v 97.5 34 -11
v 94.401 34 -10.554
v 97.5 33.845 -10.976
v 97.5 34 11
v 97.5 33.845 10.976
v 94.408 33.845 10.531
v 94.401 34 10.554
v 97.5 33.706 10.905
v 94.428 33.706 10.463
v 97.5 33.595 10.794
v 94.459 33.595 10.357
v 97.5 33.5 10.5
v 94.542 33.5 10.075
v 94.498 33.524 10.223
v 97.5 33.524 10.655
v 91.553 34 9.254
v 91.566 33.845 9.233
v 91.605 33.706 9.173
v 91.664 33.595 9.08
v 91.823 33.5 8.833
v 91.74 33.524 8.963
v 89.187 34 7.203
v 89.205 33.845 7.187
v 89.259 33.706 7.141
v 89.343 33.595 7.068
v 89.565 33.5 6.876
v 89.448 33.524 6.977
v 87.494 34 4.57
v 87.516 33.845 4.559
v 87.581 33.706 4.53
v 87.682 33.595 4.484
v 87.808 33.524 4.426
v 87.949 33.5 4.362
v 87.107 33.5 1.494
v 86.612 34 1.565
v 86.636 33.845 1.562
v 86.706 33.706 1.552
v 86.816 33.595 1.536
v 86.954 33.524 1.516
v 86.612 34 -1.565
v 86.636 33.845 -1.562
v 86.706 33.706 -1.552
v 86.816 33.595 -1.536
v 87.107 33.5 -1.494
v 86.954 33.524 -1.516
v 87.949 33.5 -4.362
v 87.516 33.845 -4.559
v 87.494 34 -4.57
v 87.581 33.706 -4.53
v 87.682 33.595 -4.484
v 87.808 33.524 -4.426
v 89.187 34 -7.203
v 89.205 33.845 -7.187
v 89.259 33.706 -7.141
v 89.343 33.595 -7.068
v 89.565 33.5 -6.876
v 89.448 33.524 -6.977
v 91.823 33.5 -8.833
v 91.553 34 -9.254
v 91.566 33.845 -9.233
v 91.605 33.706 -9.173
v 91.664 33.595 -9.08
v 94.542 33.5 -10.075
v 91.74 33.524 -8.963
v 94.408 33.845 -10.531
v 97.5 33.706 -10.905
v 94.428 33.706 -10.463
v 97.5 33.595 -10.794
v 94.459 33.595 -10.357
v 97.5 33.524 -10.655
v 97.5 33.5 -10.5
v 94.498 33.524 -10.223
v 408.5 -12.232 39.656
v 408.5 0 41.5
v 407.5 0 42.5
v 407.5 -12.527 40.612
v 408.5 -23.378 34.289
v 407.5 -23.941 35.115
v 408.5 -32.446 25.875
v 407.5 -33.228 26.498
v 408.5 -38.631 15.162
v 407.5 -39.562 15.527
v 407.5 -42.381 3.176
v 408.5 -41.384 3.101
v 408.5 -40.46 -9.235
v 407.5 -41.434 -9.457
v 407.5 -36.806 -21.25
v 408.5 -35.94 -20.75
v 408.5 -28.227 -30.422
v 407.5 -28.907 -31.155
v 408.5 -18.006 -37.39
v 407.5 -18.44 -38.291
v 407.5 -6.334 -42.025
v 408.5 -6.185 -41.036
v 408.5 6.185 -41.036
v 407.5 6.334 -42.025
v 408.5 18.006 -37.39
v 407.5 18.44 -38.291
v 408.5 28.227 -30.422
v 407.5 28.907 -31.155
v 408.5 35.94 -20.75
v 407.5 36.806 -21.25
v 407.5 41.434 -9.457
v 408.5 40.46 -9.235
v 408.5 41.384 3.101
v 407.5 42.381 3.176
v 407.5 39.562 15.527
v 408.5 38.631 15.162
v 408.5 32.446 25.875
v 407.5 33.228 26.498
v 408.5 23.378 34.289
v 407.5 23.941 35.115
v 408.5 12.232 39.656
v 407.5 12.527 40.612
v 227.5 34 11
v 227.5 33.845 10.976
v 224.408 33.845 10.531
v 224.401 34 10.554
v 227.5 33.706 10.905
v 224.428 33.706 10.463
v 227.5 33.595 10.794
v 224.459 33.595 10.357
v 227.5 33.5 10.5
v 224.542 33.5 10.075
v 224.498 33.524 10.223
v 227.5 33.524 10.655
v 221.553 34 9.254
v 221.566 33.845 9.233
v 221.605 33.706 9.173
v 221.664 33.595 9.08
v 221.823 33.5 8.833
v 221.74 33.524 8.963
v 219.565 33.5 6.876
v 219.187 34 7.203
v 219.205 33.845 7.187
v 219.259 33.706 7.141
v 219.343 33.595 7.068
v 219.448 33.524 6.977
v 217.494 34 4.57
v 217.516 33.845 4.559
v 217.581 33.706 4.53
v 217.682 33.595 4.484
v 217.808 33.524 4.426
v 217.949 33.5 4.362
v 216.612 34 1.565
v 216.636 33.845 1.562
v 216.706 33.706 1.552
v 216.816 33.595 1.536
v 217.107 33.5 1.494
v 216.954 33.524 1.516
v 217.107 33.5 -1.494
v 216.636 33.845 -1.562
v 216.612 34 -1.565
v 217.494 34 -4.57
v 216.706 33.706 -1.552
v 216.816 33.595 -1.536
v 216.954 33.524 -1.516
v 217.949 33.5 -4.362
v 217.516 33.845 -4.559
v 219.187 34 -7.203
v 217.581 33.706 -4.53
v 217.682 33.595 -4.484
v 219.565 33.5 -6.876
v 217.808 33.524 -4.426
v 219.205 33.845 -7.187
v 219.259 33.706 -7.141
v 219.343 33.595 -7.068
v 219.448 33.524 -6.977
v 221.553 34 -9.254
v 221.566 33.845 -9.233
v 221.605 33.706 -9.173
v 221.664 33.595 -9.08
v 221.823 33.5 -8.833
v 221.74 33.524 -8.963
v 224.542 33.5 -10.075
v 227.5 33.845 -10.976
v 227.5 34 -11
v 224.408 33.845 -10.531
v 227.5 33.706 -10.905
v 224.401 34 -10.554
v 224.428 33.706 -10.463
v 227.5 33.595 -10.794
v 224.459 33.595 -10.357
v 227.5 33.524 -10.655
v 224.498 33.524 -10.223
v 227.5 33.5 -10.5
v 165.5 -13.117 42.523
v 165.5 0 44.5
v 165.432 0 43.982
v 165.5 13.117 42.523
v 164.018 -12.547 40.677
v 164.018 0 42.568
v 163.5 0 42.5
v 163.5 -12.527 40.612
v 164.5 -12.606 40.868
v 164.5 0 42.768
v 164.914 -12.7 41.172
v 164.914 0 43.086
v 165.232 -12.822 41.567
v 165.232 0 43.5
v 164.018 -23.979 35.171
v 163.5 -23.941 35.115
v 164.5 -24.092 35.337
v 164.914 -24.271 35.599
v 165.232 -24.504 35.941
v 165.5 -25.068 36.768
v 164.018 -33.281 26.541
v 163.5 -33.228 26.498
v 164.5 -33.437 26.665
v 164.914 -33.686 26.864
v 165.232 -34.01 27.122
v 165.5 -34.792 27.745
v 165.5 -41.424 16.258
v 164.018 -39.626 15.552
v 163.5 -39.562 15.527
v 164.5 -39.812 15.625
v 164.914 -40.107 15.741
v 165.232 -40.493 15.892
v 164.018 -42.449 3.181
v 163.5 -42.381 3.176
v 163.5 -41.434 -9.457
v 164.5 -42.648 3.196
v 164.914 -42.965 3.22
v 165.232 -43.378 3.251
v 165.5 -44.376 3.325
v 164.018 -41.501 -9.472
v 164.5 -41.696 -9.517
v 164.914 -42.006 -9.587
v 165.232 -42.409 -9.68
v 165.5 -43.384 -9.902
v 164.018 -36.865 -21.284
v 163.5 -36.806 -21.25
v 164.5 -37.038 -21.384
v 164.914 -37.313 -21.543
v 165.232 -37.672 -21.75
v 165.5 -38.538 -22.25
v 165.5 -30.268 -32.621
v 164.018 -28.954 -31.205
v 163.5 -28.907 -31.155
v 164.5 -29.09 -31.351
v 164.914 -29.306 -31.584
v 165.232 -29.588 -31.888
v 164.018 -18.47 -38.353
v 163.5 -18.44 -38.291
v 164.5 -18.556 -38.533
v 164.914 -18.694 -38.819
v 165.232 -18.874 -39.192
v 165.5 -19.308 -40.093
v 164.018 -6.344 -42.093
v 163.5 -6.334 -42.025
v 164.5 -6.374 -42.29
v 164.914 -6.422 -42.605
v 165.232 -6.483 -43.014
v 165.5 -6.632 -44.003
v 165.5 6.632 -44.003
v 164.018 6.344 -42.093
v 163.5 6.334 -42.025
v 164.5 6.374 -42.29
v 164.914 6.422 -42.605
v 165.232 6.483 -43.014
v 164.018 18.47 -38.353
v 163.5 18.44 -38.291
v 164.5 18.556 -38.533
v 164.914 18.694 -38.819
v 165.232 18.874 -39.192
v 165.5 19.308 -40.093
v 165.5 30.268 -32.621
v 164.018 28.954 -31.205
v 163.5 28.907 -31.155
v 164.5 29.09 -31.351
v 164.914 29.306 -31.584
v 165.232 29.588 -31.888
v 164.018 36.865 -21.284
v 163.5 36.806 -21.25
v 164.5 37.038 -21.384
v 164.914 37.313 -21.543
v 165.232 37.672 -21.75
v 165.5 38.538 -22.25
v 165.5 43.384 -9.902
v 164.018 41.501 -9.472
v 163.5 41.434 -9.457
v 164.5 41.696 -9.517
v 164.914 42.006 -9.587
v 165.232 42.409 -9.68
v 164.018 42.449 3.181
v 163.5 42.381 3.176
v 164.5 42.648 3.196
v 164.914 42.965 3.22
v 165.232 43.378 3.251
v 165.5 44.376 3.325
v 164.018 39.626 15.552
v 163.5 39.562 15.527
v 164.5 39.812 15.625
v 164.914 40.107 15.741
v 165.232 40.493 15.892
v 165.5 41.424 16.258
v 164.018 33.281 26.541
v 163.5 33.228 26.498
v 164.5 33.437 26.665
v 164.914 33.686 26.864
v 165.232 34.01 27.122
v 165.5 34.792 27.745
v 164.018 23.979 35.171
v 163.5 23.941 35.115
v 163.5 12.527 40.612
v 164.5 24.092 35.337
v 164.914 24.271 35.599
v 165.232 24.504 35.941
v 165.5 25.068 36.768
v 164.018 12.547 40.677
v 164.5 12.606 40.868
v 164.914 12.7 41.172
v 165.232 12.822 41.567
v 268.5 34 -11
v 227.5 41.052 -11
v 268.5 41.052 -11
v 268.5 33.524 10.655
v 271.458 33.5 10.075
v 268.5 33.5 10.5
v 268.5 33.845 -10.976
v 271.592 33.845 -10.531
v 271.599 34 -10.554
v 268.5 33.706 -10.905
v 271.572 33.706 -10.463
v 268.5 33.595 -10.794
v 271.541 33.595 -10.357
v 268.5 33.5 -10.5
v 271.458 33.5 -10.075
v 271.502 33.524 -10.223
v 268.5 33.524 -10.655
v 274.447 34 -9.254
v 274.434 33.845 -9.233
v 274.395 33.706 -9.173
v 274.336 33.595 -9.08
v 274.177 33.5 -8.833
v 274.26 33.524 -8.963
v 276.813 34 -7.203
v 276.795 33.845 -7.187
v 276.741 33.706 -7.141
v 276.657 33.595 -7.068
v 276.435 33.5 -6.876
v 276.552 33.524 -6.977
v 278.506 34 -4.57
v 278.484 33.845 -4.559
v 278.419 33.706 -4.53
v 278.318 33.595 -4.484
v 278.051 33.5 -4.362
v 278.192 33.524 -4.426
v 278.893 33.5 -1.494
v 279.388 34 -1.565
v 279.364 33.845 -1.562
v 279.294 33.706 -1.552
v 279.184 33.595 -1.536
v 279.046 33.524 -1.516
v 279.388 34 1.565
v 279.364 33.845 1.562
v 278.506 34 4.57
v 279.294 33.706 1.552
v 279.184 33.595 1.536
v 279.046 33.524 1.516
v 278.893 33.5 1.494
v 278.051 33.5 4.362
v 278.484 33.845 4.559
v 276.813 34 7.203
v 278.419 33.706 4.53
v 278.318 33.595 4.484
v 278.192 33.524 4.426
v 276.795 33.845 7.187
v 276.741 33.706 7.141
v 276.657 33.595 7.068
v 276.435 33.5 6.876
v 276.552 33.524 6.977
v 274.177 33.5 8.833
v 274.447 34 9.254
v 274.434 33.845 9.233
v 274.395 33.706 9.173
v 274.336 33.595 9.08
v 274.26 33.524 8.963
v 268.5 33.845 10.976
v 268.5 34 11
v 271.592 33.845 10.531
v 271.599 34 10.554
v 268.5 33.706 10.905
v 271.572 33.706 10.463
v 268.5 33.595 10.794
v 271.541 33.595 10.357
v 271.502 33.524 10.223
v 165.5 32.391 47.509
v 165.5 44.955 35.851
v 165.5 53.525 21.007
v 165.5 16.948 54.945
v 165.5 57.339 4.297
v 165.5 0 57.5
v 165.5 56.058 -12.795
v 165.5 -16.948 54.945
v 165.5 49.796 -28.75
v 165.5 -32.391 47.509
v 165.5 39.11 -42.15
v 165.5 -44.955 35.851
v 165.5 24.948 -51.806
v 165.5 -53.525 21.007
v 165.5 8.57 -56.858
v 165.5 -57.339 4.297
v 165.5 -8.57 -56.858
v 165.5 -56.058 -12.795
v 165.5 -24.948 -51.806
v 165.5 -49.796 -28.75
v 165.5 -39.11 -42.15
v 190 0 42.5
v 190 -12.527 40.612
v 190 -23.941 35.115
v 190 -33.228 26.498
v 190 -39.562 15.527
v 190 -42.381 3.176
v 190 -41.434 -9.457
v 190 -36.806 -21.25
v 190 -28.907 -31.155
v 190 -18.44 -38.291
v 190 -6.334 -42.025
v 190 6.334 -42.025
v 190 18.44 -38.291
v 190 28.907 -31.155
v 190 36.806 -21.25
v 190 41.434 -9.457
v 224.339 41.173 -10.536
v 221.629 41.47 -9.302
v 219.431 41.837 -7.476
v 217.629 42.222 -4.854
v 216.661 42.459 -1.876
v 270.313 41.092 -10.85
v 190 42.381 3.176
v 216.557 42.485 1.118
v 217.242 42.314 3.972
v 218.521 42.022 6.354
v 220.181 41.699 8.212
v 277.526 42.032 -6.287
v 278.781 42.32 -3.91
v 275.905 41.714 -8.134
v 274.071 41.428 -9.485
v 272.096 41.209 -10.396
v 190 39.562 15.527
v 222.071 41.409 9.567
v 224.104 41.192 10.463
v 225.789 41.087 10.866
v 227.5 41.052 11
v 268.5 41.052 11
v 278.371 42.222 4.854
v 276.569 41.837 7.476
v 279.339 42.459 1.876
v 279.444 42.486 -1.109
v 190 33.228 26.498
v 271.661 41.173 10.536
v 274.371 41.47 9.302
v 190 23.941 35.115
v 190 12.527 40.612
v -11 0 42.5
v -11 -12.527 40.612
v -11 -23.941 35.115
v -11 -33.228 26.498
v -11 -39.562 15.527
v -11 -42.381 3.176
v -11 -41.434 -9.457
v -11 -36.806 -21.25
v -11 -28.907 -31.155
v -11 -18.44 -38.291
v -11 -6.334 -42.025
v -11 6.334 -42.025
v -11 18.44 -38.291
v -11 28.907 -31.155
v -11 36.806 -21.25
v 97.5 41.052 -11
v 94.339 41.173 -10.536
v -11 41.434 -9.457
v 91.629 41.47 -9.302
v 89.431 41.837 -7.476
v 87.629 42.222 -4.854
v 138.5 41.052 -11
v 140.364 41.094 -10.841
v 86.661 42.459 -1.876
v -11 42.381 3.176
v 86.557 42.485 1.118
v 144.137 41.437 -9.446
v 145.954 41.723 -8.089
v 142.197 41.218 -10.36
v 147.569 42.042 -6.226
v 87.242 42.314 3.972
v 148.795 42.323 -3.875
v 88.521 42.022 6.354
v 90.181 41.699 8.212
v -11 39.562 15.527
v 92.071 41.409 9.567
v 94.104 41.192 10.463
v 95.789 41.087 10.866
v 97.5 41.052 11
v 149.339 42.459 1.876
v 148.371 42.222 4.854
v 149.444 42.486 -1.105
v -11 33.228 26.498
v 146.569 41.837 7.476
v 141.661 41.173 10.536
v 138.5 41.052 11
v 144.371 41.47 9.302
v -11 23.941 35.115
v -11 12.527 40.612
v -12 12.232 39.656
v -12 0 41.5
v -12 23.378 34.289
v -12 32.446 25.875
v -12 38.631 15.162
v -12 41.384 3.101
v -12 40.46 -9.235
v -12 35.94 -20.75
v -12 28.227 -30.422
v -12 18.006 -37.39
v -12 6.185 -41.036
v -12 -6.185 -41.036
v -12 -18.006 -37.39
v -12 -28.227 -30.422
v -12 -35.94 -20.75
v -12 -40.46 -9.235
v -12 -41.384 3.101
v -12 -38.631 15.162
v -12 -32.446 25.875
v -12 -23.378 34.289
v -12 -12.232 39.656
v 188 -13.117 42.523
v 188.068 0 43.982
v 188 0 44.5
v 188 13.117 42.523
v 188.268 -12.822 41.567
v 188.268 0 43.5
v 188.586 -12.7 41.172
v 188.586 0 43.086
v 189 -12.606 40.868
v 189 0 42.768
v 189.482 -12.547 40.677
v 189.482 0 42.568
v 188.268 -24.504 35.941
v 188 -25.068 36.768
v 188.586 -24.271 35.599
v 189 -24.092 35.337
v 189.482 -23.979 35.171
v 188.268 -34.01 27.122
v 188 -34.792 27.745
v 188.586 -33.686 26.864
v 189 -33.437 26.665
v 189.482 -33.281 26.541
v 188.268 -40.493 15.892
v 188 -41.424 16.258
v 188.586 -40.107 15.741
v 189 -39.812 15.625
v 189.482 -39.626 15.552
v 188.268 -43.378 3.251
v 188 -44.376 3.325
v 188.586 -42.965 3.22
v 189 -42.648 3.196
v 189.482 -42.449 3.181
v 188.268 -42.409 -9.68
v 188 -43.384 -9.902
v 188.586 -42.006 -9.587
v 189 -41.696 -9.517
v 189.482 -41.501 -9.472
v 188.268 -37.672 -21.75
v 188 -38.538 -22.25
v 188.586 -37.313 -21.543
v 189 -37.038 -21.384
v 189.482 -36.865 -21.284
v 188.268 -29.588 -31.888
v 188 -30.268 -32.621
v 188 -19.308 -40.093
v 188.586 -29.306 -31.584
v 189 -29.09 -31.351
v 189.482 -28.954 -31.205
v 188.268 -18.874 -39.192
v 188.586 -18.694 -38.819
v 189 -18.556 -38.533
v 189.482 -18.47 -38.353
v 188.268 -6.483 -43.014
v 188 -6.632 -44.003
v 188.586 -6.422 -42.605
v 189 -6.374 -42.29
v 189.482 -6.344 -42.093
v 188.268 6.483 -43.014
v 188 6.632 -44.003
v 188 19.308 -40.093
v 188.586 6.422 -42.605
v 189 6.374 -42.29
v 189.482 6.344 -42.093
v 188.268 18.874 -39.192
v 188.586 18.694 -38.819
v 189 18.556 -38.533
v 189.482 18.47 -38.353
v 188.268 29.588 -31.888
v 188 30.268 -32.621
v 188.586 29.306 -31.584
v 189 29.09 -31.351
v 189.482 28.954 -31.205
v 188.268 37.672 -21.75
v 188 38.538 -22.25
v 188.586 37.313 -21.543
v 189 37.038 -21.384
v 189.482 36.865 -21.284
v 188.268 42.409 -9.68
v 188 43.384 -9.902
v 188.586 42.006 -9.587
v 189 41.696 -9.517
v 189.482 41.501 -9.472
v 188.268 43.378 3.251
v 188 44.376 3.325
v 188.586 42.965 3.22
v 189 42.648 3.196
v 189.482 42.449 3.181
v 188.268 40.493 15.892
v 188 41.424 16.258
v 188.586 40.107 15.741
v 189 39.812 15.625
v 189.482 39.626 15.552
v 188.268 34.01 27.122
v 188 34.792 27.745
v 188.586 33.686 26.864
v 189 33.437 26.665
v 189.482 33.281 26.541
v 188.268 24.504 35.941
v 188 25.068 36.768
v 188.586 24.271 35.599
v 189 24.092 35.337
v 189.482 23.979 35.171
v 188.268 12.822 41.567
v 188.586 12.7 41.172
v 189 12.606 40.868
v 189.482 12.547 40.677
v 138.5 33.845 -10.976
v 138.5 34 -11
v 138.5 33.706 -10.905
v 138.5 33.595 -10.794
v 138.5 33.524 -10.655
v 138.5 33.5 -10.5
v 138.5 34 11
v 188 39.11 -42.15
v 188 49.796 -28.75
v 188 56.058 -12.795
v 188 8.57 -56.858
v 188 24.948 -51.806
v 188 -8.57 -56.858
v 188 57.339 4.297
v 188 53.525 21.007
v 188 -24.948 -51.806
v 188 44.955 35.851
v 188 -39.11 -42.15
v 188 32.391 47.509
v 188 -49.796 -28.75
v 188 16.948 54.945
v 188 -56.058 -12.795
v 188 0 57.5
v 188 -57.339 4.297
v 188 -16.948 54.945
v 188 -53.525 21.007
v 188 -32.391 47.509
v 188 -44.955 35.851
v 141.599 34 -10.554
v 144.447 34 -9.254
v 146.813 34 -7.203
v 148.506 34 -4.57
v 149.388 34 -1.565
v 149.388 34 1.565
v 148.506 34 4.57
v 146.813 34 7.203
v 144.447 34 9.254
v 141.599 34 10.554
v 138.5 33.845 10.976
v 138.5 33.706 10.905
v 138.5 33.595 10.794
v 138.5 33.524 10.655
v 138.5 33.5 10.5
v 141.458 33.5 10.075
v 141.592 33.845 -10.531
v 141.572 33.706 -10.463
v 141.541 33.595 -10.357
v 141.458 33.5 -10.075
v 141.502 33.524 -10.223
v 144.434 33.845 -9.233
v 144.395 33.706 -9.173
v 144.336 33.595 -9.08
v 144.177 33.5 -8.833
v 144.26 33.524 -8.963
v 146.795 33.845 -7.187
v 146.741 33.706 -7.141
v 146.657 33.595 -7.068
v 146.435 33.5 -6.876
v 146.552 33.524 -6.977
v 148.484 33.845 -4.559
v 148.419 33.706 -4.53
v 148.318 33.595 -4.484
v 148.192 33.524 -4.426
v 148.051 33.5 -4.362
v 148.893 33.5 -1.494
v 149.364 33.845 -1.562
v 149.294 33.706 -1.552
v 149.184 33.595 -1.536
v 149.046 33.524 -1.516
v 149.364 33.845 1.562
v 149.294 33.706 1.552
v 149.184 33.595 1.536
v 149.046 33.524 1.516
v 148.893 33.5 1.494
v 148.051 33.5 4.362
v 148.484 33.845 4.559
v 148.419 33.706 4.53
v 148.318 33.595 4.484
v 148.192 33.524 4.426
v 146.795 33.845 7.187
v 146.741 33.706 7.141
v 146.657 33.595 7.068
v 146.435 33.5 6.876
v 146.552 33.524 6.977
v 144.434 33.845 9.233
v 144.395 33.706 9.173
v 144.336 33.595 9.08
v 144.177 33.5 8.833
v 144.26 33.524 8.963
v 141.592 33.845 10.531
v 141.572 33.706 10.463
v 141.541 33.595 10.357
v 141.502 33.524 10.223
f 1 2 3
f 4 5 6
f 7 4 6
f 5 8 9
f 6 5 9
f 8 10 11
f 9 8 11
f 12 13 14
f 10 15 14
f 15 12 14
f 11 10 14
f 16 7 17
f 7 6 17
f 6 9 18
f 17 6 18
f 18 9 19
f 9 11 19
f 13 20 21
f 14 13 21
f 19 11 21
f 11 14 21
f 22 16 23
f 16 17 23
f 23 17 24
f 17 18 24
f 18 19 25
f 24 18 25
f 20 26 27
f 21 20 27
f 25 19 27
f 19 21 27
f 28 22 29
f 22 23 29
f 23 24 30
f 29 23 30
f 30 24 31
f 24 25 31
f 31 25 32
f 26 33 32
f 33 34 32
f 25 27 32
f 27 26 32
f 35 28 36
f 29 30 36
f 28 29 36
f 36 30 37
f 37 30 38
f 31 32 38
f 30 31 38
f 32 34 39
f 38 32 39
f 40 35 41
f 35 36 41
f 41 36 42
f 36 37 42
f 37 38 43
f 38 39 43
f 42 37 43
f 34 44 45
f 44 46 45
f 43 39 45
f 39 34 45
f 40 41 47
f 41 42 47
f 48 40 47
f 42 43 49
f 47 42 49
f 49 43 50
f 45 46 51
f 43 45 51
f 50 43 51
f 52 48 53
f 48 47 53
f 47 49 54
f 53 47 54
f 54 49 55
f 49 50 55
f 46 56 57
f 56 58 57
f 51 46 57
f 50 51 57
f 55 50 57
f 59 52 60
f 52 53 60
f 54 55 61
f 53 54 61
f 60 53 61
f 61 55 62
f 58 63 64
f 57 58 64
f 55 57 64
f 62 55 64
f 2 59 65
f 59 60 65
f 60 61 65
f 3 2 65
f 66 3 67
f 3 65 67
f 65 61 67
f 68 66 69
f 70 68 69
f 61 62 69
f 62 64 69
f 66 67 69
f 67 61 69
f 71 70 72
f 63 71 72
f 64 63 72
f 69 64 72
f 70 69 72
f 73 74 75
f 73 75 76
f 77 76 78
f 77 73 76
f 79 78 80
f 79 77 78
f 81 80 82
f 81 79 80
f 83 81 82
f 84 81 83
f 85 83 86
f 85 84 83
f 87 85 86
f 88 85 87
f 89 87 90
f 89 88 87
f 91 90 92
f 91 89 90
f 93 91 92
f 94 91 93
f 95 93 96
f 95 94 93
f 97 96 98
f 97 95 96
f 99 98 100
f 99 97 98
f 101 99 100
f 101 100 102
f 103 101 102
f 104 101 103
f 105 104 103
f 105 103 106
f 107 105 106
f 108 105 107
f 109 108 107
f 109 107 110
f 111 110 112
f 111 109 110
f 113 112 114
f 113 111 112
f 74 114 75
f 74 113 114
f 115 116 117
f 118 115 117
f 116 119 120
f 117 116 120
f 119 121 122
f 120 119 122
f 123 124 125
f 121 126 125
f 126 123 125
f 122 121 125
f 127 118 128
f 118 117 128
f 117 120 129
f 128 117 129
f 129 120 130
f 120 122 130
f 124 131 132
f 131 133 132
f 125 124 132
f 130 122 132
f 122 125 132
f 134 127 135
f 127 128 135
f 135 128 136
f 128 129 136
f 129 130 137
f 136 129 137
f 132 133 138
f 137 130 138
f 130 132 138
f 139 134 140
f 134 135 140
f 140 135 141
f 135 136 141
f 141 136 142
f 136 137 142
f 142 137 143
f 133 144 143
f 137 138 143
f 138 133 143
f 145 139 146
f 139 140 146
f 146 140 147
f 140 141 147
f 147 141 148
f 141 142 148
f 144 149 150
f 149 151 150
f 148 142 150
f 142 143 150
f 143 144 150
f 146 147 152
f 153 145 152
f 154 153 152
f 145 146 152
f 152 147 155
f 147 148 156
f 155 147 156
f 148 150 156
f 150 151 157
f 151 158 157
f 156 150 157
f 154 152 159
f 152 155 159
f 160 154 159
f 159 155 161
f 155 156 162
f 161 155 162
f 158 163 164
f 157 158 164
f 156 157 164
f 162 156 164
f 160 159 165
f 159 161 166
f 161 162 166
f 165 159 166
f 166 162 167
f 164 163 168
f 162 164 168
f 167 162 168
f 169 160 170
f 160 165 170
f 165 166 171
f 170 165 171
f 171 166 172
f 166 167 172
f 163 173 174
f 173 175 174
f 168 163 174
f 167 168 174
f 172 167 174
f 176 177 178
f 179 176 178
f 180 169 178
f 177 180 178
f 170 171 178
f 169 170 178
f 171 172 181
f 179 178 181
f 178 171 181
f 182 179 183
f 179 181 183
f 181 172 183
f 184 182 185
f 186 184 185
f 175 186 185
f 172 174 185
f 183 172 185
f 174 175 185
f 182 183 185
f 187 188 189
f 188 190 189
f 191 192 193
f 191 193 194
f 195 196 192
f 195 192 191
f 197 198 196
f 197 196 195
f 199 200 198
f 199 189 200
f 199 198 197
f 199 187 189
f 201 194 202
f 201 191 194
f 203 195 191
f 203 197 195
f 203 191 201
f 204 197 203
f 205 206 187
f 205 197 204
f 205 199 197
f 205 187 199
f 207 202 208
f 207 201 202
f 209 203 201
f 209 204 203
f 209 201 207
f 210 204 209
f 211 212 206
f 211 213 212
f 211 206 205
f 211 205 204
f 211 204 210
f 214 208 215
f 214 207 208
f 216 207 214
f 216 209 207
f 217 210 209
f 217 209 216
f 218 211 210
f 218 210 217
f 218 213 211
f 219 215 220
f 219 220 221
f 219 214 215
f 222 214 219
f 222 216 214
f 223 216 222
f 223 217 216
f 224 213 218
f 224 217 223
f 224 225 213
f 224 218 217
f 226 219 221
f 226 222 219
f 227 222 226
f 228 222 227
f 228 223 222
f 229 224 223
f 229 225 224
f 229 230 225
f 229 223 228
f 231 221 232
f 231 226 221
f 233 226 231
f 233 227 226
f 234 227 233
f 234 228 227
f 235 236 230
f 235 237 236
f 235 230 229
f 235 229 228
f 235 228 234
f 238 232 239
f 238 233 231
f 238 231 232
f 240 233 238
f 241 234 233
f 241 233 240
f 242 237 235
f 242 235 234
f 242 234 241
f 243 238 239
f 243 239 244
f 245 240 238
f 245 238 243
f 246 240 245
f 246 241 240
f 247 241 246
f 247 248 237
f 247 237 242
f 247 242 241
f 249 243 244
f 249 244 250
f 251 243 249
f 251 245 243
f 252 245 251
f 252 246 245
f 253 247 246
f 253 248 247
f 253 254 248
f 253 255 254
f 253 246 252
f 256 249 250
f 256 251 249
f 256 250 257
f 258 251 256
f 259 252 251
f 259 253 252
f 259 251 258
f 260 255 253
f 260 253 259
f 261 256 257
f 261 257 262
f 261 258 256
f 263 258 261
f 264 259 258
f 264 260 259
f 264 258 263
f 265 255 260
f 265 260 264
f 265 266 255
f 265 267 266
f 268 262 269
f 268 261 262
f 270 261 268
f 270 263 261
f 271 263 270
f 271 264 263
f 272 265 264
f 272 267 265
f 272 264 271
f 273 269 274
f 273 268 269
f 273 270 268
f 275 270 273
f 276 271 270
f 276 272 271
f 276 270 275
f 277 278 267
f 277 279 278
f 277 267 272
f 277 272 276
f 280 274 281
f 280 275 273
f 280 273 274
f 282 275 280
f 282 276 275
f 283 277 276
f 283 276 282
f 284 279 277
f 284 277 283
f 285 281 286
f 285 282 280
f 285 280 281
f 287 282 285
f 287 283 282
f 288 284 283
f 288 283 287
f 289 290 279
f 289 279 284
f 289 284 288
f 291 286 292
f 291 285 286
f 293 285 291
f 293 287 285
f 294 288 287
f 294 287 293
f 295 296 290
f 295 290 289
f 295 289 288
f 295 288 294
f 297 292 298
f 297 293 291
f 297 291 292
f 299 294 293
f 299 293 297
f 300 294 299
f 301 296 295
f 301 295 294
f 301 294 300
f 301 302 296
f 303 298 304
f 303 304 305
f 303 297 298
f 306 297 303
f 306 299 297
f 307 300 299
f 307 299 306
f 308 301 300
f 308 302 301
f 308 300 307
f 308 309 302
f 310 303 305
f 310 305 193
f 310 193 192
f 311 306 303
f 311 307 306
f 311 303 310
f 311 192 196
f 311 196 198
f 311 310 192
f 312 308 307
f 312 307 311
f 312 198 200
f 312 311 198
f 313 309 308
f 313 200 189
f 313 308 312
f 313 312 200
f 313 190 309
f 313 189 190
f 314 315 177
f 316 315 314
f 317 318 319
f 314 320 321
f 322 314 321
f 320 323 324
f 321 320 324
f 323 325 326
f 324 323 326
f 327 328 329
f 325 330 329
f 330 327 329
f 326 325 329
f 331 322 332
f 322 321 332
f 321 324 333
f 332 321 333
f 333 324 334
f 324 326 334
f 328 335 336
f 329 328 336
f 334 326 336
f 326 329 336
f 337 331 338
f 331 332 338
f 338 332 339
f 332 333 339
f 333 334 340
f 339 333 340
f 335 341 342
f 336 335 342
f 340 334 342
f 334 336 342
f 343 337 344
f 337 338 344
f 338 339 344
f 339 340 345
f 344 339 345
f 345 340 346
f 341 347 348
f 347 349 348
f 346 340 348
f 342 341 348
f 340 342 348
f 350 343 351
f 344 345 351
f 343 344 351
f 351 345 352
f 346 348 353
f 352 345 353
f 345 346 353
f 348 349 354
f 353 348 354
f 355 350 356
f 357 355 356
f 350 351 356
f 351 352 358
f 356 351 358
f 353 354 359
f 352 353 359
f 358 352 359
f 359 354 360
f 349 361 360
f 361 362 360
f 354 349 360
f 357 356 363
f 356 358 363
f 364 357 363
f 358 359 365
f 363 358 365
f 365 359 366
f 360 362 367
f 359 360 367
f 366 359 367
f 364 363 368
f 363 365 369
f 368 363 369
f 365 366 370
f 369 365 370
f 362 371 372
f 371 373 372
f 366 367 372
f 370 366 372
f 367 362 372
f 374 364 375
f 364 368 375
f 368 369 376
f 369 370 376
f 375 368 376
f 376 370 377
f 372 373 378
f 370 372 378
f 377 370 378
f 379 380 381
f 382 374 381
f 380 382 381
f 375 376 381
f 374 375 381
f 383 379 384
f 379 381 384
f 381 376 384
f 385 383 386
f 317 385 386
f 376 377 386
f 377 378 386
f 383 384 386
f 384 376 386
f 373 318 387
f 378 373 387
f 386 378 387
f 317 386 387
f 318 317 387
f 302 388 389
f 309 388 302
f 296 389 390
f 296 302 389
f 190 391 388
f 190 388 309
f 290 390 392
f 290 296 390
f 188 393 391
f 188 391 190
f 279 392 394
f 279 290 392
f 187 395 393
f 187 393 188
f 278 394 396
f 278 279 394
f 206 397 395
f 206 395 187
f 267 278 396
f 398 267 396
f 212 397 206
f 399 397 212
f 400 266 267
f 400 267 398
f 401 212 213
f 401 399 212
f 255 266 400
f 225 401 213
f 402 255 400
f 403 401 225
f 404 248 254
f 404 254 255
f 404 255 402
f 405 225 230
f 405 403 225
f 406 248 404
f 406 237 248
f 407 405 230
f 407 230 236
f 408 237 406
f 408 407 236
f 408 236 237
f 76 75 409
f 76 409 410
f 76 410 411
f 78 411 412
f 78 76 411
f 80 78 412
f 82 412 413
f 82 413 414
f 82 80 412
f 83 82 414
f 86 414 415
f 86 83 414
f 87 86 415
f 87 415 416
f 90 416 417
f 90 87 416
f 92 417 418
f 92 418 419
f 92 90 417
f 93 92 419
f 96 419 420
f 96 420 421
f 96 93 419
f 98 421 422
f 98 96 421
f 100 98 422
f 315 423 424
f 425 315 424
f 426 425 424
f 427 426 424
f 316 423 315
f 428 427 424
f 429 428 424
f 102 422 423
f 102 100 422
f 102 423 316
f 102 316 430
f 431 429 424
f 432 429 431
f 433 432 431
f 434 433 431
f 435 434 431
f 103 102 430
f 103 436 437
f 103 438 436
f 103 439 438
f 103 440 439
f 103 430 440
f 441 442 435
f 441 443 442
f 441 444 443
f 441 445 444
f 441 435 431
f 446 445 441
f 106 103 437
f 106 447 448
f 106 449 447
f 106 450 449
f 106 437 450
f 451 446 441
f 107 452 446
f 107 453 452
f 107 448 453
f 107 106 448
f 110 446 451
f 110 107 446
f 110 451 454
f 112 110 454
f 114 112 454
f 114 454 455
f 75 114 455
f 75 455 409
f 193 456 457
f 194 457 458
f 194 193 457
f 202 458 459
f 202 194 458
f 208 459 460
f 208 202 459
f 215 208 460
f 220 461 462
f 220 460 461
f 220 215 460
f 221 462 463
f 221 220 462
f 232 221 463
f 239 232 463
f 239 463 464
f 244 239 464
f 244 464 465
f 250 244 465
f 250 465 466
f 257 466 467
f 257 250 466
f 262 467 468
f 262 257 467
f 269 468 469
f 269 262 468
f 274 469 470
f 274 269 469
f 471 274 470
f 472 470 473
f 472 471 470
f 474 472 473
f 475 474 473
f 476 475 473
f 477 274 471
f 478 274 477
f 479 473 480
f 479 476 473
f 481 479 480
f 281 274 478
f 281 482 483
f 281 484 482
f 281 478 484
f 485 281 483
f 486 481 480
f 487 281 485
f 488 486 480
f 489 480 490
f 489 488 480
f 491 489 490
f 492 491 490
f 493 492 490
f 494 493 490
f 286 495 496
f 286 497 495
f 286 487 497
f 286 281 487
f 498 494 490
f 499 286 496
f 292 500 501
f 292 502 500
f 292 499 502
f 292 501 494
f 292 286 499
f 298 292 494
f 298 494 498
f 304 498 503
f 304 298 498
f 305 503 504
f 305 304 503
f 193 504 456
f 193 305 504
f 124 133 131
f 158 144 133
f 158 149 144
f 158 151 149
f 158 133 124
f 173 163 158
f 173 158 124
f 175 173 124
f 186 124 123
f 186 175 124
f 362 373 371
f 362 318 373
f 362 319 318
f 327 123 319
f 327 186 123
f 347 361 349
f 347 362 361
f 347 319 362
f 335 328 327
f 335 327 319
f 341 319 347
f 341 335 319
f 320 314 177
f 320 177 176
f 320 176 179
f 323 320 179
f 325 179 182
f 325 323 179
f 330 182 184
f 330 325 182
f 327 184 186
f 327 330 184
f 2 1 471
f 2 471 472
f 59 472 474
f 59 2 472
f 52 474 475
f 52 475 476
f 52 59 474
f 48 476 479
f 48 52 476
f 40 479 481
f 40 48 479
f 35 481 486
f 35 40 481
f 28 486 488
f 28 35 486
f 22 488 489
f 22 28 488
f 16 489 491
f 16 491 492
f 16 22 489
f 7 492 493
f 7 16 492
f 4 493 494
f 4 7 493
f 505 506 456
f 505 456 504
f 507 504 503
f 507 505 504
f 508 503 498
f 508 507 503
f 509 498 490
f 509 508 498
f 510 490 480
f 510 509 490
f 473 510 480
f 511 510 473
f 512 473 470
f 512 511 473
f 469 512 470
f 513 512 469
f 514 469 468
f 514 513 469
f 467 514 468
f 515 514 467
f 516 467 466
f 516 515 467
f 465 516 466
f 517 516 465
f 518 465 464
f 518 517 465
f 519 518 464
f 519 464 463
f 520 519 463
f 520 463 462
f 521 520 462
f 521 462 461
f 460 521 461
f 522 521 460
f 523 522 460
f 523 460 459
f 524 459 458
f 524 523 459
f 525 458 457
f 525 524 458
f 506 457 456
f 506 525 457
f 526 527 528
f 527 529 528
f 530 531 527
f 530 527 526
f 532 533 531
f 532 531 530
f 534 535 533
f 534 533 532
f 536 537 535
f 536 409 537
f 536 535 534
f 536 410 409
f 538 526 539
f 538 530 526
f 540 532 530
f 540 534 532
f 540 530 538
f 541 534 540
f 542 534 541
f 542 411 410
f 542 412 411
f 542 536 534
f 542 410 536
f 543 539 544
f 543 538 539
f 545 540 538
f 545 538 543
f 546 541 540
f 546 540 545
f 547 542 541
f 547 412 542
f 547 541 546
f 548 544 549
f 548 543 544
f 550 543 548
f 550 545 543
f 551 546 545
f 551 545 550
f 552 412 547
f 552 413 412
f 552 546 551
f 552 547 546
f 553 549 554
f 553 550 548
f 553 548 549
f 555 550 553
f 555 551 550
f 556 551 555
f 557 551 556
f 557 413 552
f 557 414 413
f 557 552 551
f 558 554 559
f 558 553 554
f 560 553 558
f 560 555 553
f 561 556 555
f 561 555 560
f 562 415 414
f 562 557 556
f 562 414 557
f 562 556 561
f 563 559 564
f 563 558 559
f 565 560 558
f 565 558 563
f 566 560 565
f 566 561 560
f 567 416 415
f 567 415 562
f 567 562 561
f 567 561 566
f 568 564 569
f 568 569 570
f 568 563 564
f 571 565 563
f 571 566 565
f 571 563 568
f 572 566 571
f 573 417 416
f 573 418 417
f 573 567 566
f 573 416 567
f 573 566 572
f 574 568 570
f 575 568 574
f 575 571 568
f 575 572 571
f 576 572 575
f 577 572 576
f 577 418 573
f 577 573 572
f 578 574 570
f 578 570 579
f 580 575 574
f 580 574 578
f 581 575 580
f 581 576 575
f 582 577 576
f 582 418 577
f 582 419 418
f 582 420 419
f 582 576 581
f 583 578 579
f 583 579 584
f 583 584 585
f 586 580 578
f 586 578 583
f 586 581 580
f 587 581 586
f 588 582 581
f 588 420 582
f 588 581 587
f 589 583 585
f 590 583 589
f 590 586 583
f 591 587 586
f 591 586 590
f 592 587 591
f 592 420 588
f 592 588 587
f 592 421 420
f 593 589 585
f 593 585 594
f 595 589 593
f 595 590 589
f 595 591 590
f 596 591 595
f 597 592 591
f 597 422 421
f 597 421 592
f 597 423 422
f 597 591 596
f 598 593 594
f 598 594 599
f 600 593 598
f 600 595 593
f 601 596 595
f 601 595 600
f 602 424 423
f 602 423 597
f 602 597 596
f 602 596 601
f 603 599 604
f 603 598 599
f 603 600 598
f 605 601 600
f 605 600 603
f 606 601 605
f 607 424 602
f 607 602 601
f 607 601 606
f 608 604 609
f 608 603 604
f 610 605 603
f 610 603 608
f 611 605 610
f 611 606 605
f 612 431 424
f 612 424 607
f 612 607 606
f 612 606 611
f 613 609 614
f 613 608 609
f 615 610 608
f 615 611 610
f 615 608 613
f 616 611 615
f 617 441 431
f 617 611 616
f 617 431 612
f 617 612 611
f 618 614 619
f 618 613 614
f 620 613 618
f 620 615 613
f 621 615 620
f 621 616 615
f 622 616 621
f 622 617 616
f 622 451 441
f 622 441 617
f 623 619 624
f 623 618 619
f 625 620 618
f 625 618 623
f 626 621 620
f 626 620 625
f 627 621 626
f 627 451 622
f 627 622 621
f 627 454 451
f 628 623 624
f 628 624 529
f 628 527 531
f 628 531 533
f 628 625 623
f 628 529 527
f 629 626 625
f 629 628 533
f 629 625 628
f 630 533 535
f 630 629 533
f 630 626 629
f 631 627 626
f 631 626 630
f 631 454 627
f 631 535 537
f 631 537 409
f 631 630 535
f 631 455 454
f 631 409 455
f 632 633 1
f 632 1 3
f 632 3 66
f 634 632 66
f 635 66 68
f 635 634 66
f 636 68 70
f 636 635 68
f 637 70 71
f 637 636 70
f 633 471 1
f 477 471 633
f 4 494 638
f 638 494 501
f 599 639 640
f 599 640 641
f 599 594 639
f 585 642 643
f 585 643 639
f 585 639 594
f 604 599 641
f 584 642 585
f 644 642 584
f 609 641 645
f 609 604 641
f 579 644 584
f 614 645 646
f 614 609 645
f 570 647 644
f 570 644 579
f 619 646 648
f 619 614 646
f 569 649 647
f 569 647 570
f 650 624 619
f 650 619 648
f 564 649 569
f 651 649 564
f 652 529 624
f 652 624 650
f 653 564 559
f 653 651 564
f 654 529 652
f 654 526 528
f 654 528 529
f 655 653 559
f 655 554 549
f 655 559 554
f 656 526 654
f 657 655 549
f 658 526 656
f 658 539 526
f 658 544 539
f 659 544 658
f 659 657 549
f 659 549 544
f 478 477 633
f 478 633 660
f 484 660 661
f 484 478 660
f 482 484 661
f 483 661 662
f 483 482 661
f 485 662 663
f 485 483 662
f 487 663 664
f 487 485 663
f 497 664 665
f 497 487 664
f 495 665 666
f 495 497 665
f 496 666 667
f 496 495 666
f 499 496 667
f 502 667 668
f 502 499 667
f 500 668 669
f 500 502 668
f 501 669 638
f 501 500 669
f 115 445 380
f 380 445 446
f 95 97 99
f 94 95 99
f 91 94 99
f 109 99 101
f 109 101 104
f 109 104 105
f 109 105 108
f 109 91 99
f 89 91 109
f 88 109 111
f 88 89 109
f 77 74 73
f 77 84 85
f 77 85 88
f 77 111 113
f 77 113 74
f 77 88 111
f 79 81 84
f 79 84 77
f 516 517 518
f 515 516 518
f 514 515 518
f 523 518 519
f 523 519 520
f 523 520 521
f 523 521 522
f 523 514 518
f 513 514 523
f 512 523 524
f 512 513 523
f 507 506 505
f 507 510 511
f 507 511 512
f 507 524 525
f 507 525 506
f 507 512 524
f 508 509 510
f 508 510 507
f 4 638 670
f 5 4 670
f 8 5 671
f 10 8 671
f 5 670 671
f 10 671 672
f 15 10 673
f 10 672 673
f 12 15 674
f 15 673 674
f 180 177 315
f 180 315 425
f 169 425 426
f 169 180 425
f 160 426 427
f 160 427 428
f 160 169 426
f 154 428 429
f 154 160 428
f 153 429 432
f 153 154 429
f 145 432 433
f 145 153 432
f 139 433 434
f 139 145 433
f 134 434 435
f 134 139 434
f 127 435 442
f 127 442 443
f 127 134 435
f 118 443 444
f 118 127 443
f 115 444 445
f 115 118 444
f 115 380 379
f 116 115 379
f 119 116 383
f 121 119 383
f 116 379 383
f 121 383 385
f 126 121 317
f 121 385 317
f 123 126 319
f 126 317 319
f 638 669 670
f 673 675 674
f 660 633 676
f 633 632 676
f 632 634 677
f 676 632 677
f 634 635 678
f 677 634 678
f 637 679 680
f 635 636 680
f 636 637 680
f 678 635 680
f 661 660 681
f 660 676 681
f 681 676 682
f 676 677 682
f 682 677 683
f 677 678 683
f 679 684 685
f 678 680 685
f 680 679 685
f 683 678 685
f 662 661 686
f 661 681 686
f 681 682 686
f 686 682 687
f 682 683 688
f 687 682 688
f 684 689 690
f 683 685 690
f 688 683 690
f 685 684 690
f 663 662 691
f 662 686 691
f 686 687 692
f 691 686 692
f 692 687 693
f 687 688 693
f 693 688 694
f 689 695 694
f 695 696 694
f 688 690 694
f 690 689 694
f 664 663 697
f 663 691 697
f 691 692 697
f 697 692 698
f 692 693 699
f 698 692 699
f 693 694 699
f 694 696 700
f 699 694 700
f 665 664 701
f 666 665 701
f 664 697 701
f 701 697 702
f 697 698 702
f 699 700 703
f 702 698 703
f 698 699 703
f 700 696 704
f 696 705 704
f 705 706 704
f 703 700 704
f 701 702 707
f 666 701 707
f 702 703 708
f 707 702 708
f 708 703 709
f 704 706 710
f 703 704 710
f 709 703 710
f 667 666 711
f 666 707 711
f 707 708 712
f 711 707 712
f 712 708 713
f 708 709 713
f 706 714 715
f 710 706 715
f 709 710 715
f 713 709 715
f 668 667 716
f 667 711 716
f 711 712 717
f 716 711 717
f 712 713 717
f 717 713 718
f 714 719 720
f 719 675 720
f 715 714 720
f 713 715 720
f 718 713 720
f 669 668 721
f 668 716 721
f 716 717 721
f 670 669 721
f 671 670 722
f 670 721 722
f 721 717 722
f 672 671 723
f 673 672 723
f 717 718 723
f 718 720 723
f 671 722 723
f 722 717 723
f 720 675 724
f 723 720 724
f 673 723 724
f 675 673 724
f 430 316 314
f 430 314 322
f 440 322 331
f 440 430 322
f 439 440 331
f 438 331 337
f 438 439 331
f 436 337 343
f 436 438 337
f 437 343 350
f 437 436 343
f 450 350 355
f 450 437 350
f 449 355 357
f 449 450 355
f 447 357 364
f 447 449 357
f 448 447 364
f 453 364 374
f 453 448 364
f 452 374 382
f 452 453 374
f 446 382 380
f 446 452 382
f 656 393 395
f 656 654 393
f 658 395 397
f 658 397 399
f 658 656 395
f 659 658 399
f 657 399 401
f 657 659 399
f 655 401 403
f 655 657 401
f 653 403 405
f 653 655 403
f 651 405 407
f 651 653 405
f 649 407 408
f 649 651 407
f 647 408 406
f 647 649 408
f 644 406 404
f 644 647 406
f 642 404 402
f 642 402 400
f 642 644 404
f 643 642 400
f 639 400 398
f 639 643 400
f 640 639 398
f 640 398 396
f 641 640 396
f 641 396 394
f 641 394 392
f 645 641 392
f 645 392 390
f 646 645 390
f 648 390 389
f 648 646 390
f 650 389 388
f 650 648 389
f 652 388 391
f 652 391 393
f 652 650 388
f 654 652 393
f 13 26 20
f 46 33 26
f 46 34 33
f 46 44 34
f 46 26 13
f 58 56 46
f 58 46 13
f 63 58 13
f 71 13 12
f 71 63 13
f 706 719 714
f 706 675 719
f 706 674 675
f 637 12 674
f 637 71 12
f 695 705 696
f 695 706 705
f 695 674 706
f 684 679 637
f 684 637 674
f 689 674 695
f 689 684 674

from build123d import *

# Parameters (mm, degrees)
TAGLIO_ESTRUSIONE1_DEPTH      = 11
TAGLIO_ESTRUSIONE1_DEPTH_BACK = 11
SCHIZZO2_W                    = 63
SCHIZZO2_H                    = 14
RACCORDO1_R                   = 0.5
RACCORDO2_R                   = 11
ESTRUSIONE_ESTRUSIONE1_START  = 30
SCHIZZO3_R                    = 42.5
ESTRUSIONE_ESTRUSIONE1_DEPTH  = 30
SCHIZZO4_R                    = 42.5
ESTRUSIONE_ESTRUSIONE2_DEPTH  = 12
RACCORDO3_R                   = 2
SMUSSO1_SIZE                  = 1


with BuildPart() as part:
    # Schizzo1 → Rivoluzione1 (revolve)
    with BuildSketch(Plane.XY, mode=Mode.PRIVATE) as rivoluzione1_sk:
        Polygon((0, 0), (0, 42.5), (165.5, 42.5), (165.5, 57.5), (188, 57.5), (188, 42.5), (378.5, 42.5), (378.5, 0), align=None)
    revolve(rivoluzione1_sk.sketch.rotate(Axis((-146.856788593, 0, 0), (1, 0, 0)), 90), axis=Axis((-146.856788593, 0, 0), (1, 0, 0)))

    # Schizzo2 → Taglio-Estrusione1 (cut, two sides: drawn at the far end of the back side and taken through both)
    with BuildSketch(Plane.XY.offset(-TAGLIO_ESTRUSIONE1_DEPTH_BACK)):
        with Locations((118, 40.5)):
            Rectangle(SCHIZZO2_W, SCHIZZO2_H)
        with Locations((248, 40.5)):
            Rectangle(SCHIZZO2_W, SCHIZZO2_H)
    extrude(amount=TAGLIO_ESTRUSIONE1_DEPTH + TAGLIO_ESTRUSIONE1_DEPTH_BACK, mode=Mode.SUBTRACT)

    # Raccordo1
    raccordo1_edges = [part.edges().sort_by_distance(p)[0] for p in [
        (149.5, 33.5, 0),
        (118, 33.5, 11),
        (86.5, 33.5, 0),
        (118, 33.5, -11),
        (279.5, 33.5, 0),
        (248, 33.5, 11),
        (216.5, 33.5, 0),
        (248, 33.5, -11),
    ]]
    fillet(raccordo1_edges, radius=RACCORDO1_R)

    # Raccordo2
    # the kernel refuses this fillet: 11 mm, written as the material it adds along each edge
    with BuildSketch(Plane(origin=(268.5, 33.5, 0), x_dir=(0, 0, -1), z_dir=(-1, 0, 0))) as raccordo2_piece_1:
        with BuildLine():
            CenterArc((10.5, -0.5), 0.5, 0, 90)
            Line((11, -0.5), (11, 0))
            Line((11, 0), (10.5, 0))
        make_face()
    revolve(axis=Axis((268.5, 33.5, 0), (0, -1, 0)), revolution_arc=90)
    with BuildSketch(Plane(origin=(268.5, 33.5, 0), x_dir=(1, 0, 0), z_dir=(0, 0, -1))) as raccordo2_piece_2:
        with BuildLine():
            CenterArc((10.5, -0.5), 0.5, 0, 90)
            Line((11, -0.5), (11, 0))
            Line((11, 0), (10.5, 0))
        make_face()
    revolve(axis=Axis((268.5, 33.5, 0), (0, -1, 0)), revolution_arc=90)
    with BuildSketch(Plane(origin=(227.5, 33.5, 0), x_dir=(0, 0, 1), z_dir=(1, 0, 0))) as raccordo2_piece_3:
        with BuildLine():
            CenterArc((10.5, -0.5), 0.5, 0, 90)
            Line((11, -0.5), (11, 0))
            Line((11, 0), (10.5, 0))
        make_face()
    revolve(axis=Axis((227.5, 33.5, 0), (0, -1, 0)), revolution_arc=90)
    with BuildSketch(Plane(origin=(227.5, 33.5, 0), x_dir=(-1, 0, 0), z_dir=(0, 0, 1))) as raccordo2_piece_4:
        with BuildLine():
            CenterArc((10.5, -0.5), 0.5, 0, 90)
            Line((11, -0.5), (11, 0))
            Line((11, 0), (10.5, 0))
        make_face()
    revolve(axis=Axis((227.5, 33.5, 0), (0, -1, 0)), revolution_arc=90)
    with BuildSketch(Plane(origin=(138.5, 33.5, 0), x_dir=(1, 0, 0), z_dir=(0, 0, -1))) as raccordo2_piece_5:
        with BuildLine():
            CenterArc((10.5, -0.5), 0.5, 0, 90)
            Line((11, -0.5), (11, 0))
            Line((11, 0), (10.5, 0))
        make_face()
    revolve(axis=Axis((138.5, 33.5, 0), (0, -1, 0)), revolution_arc=90)
    with BuildSketch(Plane(origin=(138.5, 33.5, 0), x_dir=(0, 0, -1), z_dir=(-1, 0, 0))) as raccordo2_piece_6:
        with BuildLine():
            CenterArc((10.5, -0.5), 0.5, 0, 90)
            Line((11, -0.5), (11, 0))
            Line((11, 0), (10.5, 0))
        make_face()
    revolve(axis=Axis((138.5, 33.5, 0), (0, -1, 0)), revolution_arc=90)
    with BuildSketch(Plane(origin=(97.5, 33.5, 0), x_dir=(0, 0, 1), z_dir=(1, 0, 0))) as raccordo2_piece_7:
        with BuildLine():
            CenterArc((10.5, -0.5), 0.5, 0, 90)
            Line((11, -0.5), (11, 0))
            Line((11, 0), (10.5, 0))
        make_face()
    revolve(axis=Axis((97.5, 33.5, 0), (0, -1, 0)), revolution_arc=90)
    with BuildSketch(Plane(origin=(97.5, 33.5, 0), x_dir=(-1, 0, 0), z_dir=(0, 0, 1))) as raccordo2_piece_8:
        with BuildLine():
            CenterArc((10.5, -0.5), 0.5, 0, 90)
            Line((11, -0.5), (11, 0))
            Line((11, 0), (10.5, 0))
        make_face()
    revolve(axis=Axis((97.5, 33.5, 0), (0, -1, 0)), revolution_arc=90)
    with BuildSketch(Plane(origin=(86.5, 33.5, -11), x_dir=(0, 0, 1), z_dir=(0, 1, 0))) as raccordo2_piece_9_section:
        with BuildLine():
            CenterArc((RACCORDO2_R, RACCORDO2_R), RACCORDO2_R, 180, 90)
            Line((0, RACCORDO2_R), (0, 0))
            Line((0, 0), (RACCORDO2_R, 0))
        make_face()
    raccordo2_piece_9 = extrude(amount=35.05179655, mode=Mode.PRIVATE)
    raccordo2_piece_9 = raccordo2_piece_9 & Plane(origin=(88.913570228, 0, 0), x_dir=(0, 0, 1), z_dir=(1, 0, 0)) * Cylinder(42.5, 115, mode=Mode.PRIVATE)
    add(raccordo2_piece_9)
    with BuildSketch(Plane(origin=(86.5, 33.5, 11), x_dir=(0, 0, -1), z_dir=(0, 1, 0))) as raccordo2_piece_10_section:
        with BuildLine():
            CenterArc((RACCORDO2_R, -RACCORDO2_R), RACCORDO2_R, 90, 90)
            Line((0, -RACCORDO2_R), (0, 0))
            Line((0, 0), (RACCORDO2_R, 0))
        make_face()
    raccordo2_piece_10 = extrude(amount=35.05179655, mode=Mode.PRIVATE)
    raccordo2_piece_10 = raccordo2_piece_10 & Plane(origin=(88.913567526, 0, 0), x_dir=(0, 0, 1), z_dir=(1, 0, 0)) * Cylinder(42.5, 115, mode=Mode.PRIVATE)
    add(raccordo2_piece_10)
    with BuildSketch(Plane(origin=(149.5, 68.55179655, -11), x_dir=(-1, 0, 0), z_dir=(0, -1, 0))) as raccordo2_piece_11_section:
        with BuildLine():
            CenterArc((RACCORDO2_R, -RACCORDO2_R), RACCORDO2_R, 90, 90)
            Line((0, -RACCORDO2_R), (0, 0))
            Line((0, 0), (RACCORDO2_R, 0))
        make_face()
    raccordo2_piece_11 = extrude(amount=35.05179655, mode=Mode.PRIVATE)
    raccordo2_piece_11 = raccordo2_piece_11 & Plane(origin=(147.086427886, 0, 0), x_dir=(0, 0, 1), z_dir=(1, 0, 0)) * Cylinder(42.5, 115, mode=Mode.PRIVATE)
    add(raccordo2_piece_11)
    with BuildSketch(Plane(origin=(149.5, 68.55179655, 11), x_dir=(-1, 0, 0), z_dir=(0, -1, 0))) as raccordo2_piece_12_section:
        with BuildLine():
            CenterArc((RACCORDO2_R, RACCORDO2_R), RACCORDO2_R, 180, 90)
            Line((0, RACCORDO2_R), (0, 0))
            Line((0, 0), (RACCORDO2_R, 0))
        make_face()
    raccordo2_piece_12 = extrude(amount=35.05179655, mode=Mode.PRIVATE)
    raccordo2_piece_12 = raccordo2_piece_12 & Plane(origin=(147.086433525, 0, 0), x_dir=(0, 0, 1), z_dir=(1, 0, 0)) * Cylinder(42.5, 115, mode=Mode.PRIVATE)
    add(raccordo2_piece_12)
    with BuildSketch(Plane(origin=(216.5, 33.5, -11), x_dir=(0, 0, 1), z_dir=(0, 1, 0))) as raccordo2_piece_13_section:
        with BuildLine():
            CenterArc((RACCORDO2_R, RACCORDO2_R), RACCORDO2_R, 180, 90)
            Line((0, RACCORDO2_R), (0, 0))
            Line((0, 0), (RACCORDO2_R, 0))
        make_face()
    raccordo2_piece_13 = extrude(amount=35.05179655, mode=Mode.PRIVATE)
    raccordo2_piece_13 = raccordo2_piece_13 & Plane(origin=(218.913570228, 0, 0), x_dir=(0, 0, 1), z_dir=(1, 0, 0)) * Cylinder(42.5, 115, mode=Mode.PRIVATE)
    add(raccordo2_piece_13)
    with BuildSketch(Plane(origin=(216.5, 33.5, 11), x_dir=(0, 0, -1), z_dir=(0, 1, 0))) as raccordo2_piece_14_section:
        with BuildLine():
            CenterArc((RACCORDO2_R, -RACCORDO2_R), RACCORDO2_R, 90, 90)
            Line((0, -RACCORDO2_R), (0, 0))
            Line((0, 0), (RACCORDO2_R, 0))
        make_face()
    raccordo2_piece_14 = extrude(amount=35.05179655, mode=Mode.PRIVATE)
    raccordo2_piece_14 = raccordo2_piece_14 & Plane(origin=(218.913567526, 0, 0), x_dir=(0, 0, 1), z_dir=(1, 0, 0)) * Cylinder(42.5, 115, mode=Mode.PRIVATE)
    add(raccordo2_piece_14)
    with BuildSketch(Plane(origin=(279.5, 68.55179655, 11), x_dir=(-1, 0, 0), z_dir=(0, -1, 0))) as raccordo2_piece_15_section:
        with BuildLine():
            CenterArc((RACCORDO2_R, RACCORDO2_R), RACCORDO2_R, 180, 90)
            Line((0, RACCORDO2_R), (0, 0))
            Line((0, 0), (RACCORDO2_R, 0))
        make_face()
    raccordo2_piece_15 = extrude(amount=35.05179655, mode=Mode.PRIVATE)
    raccordo2_piece_15 = raccordo2_piece_15 & Plane(origin=(277.086433525, 0, 0), x_dir=(0, 0, 1), z_dir=(1, 0, 0)) * Cylinder(42.5, 115, mode=Mode.PRIVATE)
    add(raccordo2_piece_15)
    with BuildSketch(Plane(origin=(279.5, 68.55179655, -11), x_dir=(0, 0, 1), z_dir=(0, -1, 0))) as raccordo2_piece_16_section:
        with BuildLine():
            CenterArc((RACCORDO2_R, RACCORDO2_R), RACCORDO2_R, 180, 90)
            Line((0, RACCORDO2_R), (0, 0))
            Line((0, 0), (RACCORDO2_R, 0))
        make_face()
    raccordo2_piece_16 = extrude(amount=35.05179655, mode=Mode.PRIVATE)
    raccordo2_piece_16 = raccordo2_piece_16 & Plane(origin=(277.086429772, 0, 0), x_dir=(0, 0, 1), z_dir=(1, 0, 0)) * Cylinder(42.5, 115, mode=Mode.PRIVATE)
    add(raccordo2_piece_16)

    # Schizzo3 → Estrusione-Estrusione1 (add)
    with BuildSketch(Plane(origin=(378.5, 0, 0), x_dir=(0, 0, -1), z_dir=(1, 0, 0)).offset(ESTRUSIONE_ESTRUSIONE1_START)):
        with Locations(Location((0, 0, 0), (0, 0, 180))):
            Circle(SCHIZZO3_R)
    extrude(amount=-ESTRUSIONE_ESTRUSIONE1_DEPTH)

    # Schizzo4 → Estrusione-Estrusione2 (add)
    with BuildSketch(Plane.ZY):
        Circle(SCHIZZO4_R)
    extrude(amount=ESTRUSIONE_ESTRUSIONE2_DEPTH)

    # Raccordo3
    raccordo3_edges = [part.edges().sort_by_distance(p)[0] for p in [
        (188, 0, -42.5),
        (165.5, 0, -42.5),
    ]]
    fillet(raccordo3_edges, radius=RACCORDO3_R)

    # Smusso1
    smusso1_edges = [part.edges().sort_by_distance(p)[0] for p in [
        (408.5, 0, -42.5),
        (-12, 0, -42.5),
    ]]
    chamfer(smusso1_edges, length=SMUSSO1_SIZE)


solid = part.part
